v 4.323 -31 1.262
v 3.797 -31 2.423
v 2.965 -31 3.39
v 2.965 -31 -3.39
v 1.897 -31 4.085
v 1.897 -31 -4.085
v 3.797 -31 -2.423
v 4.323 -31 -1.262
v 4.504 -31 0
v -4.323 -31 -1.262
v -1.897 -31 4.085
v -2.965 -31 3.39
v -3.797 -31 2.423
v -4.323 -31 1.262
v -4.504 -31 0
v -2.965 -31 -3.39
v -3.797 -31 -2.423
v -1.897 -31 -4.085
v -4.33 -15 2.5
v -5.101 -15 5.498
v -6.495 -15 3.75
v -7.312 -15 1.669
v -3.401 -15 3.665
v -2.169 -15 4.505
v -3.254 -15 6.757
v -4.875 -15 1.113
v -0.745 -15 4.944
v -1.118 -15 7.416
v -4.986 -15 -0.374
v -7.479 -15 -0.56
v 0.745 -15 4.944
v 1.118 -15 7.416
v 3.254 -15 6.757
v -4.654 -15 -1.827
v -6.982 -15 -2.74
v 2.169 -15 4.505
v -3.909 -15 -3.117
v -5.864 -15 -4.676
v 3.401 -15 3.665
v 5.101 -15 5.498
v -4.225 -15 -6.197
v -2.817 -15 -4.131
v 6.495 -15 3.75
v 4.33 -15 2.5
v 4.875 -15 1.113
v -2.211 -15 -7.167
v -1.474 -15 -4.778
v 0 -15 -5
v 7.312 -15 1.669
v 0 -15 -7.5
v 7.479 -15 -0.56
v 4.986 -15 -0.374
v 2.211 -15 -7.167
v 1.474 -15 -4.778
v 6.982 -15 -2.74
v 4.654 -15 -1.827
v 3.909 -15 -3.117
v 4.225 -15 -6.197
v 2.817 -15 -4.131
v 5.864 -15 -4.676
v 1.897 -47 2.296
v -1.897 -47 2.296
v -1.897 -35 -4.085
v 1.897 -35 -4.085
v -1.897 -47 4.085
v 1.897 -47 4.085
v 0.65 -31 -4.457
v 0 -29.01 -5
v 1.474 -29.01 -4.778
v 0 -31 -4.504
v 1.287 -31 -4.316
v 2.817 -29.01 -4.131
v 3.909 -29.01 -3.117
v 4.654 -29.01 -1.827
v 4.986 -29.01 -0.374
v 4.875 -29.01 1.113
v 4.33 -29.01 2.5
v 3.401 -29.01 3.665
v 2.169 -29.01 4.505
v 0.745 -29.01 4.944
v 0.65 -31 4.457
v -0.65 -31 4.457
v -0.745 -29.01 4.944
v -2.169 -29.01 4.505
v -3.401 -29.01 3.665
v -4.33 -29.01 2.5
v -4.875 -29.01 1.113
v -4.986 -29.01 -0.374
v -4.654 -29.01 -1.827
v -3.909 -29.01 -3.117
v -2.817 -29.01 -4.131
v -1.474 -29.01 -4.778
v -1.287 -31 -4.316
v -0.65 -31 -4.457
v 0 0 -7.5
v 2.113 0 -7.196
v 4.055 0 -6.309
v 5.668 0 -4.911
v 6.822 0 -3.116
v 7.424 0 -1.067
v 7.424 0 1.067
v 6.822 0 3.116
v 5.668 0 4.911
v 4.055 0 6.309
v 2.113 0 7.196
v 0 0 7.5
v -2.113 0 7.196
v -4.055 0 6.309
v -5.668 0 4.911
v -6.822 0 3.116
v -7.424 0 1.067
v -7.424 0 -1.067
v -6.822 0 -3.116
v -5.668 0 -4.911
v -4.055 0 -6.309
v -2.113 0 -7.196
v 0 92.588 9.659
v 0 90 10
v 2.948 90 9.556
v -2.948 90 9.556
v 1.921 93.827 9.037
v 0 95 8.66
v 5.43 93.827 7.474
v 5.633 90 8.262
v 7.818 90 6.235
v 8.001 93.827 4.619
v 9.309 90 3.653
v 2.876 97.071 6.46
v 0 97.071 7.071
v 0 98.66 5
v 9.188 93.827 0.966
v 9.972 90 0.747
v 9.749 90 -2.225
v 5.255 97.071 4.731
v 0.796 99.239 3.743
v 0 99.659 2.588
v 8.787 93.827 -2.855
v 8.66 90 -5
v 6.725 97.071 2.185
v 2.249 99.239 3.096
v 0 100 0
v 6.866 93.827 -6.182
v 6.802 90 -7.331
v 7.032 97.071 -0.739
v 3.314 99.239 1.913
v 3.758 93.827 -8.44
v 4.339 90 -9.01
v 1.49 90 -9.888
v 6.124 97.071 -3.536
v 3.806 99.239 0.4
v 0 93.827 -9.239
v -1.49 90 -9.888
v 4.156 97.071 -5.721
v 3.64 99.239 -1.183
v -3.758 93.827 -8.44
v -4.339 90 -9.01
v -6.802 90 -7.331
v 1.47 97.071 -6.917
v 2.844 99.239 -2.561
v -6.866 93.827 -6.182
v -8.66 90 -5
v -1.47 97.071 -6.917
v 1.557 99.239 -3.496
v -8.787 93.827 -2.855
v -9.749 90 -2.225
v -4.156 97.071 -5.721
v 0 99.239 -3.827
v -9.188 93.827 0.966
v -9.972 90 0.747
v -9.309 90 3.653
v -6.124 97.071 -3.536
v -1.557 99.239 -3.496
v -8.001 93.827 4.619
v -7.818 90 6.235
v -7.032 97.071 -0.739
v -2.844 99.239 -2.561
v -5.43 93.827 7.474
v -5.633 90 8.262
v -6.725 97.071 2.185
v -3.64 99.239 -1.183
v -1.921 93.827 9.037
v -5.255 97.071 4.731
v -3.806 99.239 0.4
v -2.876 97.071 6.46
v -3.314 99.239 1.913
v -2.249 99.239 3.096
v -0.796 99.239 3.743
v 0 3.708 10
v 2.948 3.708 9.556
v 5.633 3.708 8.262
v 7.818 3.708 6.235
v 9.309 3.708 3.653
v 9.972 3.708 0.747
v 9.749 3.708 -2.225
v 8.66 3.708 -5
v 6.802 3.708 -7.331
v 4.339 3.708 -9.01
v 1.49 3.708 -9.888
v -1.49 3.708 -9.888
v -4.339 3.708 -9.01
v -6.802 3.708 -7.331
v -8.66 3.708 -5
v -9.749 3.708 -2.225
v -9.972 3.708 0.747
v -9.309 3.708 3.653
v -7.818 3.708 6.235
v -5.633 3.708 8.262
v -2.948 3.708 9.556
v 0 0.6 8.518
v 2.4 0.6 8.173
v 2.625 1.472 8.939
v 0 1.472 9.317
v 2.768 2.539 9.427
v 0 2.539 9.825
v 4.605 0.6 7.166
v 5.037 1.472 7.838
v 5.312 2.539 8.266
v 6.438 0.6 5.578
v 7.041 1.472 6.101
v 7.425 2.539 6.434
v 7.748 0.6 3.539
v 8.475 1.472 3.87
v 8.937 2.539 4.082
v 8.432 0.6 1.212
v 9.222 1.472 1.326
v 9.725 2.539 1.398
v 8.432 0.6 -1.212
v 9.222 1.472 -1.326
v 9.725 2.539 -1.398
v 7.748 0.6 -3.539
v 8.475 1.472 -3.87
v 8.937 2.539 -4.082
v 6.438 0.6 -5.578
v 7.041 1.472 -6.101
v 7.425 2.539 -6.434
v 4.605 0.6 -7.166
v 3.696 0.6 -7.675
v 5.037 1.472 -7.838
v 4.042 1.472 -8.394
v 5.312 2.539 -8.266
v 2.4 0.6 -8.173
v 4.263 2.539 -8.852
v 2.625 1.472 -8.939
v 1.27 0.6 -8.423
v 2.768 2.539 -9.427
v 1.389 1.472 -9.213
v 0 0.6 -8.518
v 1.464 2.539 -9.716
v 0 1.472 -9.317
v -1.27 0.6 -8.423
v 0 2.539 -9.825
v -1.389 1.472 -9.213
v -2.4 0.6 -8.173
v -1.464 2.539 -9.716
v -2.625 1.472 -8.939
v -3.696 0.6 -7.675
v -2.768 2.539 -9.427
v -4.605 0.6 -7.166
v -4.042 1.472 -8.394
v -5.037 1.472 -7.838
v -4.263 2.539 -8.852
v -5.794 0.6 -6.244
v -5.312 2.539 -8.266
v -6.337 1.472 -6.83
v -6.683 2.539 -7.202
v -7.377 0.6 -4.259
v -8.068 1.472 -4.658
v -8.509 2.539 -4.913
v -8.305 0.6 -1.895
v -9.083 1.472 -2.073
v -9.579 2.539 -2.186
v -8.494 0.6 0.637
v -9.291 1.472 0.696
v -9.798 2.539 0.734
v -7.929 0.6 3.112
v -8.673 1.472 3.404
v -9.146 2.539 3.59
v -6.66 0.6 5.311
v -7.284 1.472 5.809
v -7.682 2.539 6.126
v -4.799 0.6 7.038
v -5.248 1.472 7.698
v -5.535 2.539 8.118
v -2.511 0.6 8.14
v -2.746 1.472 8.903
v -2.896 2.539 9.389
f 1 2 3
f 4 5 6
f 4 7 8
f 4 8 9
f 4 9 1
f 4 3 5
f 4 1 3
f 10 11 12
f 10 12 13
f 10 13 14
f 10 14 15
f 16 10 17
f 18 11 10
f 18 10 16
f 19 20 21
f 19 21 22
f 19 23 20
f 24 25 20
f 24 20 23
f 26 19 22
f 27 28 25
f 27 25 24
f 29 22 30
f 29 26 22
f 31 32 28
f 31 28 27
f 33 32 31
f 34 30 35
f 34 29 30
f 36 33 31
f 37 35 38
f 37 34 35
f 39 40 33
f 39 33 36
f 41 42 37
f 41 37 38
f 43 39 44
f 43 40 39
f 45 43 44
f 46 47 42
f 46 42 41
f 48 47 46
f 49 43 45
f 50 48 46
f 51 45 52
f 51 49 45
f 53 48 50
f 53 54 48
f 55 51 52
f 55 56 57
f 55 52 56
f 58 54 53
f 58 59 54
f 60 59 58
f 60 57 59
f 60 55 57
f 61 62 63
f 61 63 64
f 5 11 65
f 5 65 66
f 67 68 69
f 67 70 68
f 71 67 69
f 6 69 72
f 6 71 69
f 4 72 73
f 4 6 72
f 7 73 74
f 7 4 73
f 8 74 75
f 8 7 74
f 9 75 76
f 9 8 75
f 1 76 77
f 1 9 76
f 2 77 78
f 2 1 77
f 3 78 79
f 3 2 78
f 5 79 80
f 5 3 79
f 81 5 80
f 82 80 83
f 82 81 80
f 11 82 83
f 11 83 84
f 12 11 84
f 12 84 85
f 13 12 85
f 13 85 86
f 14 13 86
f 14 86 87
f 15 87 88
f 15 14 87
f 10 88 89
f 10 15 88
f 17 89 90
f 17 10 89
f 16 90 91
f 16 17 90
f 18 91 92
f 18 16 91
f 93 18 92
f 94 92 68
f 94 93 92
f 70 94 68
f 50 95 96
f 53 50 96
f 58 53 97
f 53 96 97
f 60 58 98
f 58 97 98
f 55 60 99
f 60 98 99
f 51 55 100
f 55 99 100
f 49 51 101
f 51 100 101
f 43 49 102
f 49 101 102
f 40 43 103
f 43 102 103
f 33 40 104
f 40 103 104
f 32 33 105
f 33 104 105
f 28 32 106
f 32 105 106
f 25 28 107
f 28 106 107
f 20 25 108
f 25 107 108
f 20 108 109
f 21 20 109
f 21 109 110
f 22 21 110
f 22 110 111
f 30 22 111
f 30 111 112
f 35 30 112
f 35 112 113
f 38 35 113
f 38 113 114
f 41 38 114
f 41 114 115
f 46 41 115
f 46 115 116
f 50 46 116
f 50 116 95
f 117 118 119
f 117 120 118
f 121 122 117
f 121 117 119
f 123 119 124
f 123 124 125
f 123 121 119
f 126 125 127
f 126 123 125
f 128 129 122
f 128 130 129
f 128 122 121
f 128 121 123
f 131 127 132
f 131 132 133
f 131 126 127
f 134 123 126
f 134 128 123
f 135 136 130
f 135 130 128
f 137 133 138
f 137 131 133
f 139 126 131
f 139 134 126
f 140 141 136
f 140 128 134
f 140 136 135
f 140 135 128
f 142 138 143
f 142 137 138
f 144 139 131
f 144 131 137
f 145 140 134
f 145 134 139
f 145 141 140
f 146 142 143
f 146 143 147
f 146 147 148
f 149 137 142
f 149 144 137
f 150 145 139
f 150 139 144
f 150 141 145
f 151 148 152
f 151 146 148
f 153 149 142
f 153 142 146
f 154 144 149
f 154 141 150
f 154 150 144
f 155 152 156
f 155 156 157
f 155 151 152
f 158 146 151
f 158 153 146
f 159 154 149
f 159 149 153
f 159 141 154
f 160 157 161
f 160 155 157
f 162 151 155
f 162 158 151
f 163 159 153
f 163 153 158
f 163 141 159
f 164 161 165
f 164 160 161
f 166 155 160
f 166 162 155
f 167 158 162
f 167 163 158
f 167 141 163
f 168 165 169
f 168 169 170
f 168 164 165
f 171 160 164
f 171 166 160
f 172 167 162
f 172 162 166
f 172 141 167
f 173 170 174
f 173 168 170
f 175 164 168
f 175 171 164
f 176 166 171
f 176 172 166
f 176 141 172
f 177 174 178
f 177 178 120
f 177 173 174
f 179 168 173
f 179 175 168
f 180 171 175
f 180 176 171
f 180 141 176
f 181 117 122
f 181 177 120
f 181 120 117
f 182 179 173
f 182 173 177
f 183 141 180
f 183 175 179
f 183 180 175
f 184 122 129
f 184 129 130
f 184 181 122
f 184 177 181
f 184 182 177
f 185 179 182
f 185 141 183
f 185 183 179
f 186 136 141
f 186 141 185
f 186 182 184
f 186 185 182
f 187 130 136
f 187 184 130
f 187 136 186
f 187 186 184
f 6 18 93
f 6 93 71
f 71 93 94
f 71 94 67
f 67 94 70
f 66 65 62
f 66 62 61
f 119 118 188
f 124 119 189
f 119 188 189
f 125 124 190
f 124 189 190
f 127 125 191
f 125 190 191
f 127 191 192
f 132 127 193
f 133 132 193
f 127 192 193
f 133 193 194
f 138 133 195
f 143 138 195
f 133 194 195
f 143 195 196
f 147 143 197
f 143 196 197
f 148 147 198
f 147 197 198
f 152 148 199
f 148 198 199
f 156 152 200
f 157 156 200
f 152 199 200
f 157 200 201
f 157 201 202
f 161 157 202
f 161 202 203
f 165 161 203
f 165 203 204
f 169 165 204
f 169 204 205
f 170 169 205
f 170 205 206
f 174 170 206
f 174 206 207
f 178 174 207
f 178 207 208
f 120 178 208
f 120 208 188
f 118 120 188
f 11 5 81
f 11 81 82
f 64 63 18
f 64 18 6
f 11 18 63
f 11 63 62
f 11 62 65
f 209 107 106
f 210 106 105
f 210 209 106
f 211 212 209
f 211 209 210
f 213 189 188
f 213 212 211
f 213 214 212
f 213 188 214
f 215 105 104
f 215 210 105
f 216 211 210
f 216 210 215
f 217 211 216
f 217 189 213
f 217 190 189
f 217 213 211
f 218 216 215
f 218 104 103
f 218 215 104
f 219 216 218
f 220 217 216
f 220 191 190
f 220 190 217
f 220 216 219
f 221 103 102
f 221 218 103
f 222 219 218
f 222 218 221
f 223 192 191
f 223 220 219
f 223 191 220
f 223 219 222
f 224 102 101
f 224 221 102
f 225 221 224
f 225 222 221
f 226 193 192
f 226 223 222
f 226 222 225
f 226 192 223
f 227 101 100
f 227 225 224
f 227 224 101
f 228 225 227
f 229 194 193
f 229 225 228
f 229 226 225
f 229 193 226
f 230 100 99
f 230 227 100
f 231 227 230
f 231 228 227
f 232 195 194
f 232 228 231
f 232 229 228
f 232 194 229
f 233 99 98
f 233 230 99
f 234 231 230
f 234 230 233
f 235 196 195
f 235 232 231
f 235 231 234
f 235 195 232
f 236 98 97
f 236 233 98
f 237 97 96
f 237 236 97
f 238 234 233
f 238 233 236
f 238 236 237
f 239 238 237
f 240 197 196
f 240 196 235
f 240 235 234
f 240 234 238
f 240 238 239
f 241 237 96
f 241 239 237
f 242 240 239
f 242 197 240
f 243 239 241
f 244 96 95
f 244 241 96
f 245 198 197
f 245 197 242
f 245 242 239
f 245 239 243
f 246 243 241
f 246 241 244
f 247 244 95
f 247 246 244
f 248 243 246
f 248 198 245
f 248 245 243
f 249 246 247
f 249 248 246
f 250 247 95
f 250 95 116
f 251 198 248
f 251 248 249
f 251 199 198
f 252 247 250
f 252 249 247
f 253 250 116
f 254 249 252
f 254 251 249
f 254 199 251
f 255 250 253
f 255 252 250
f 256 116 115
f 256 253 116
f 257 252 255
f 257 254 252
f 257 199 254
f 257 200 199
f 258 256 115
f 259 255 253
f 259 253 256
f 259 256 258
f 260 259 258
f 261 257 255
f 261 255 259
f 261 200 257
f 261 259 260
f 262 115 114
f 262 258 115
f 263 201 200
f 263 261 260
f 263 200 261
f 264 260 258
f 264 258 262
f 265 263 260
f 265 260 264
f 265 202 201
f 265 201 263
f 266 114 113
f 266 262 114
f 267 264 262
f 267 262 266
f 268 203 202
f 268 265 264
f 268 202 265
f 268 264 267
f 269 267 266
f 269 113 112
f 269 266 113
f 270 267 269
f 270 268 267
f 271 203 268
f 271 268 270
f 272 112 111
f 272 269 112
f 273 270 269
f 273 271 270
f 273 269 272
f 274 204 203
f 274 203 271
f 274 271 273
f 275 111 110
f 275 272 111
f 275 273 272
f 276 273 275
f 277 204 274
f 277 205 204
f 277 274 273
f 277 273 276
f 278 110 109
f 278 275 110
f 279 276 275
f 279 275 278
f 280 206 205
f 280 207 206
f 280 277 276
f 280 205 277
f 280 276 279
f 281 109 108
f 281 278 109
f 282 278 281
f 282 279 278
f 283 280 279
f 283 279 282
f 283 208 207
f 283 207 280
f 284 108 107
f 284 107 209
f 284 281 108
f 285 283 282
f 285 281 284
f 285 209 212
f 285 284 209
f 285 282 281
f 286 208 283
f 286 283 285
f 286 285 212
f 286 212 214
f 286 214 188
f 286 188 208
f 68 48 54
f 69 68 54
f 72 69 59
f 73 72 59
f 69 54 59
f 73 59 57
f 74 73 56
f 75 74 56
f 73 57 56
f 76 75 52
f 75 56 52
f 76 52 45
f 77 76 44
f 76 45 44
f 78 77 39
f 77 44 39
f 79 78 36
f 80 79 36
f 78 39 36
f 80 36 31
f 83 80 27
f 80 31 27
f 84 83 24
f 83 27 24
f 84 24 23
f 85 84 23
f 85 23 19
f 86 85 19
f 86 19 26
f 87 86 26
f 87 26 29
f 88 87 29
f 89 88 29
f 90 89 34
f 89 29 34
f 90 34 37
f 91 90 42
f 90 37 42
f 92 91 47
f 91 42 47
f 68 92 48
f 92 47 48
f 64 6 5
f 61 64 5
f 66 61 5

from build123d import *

# Parameters (mm, degrees)
CROQUIS1_R              = 10
SALIENTE_EXTRUIR1_DEPTH = 100
CROQUIS2_R              = 7.5
SALIENTE_EXTRUIR2_DEPTH = 15
CROQUIS3_R              = 5
SALIENTE_EXTRUIR3_DEPTH = 16
REDONDEO1_R             = 4
CHAFL_N1_SIZE           = 1.99
CHAFL_N1_SIZE2          = 0.496162726
CROQUIS4_W              = 3.793672416
CROQUIS4_H              = 8.169837842
SALIENTE_EXTRUIR4_DEPTH = 16
CHAFL_N2_SIZE           = 12
CHAFL_N2_SIZE2          = 6.38051318
REDONDEO2_R             = 10


with BuildPart() as part:
    # Croquis1 → Saliente-Extruir1 (new body)
    with BuildSketch(Plane(origin=(0, 0, 0), x_dir=(1, 0, 0), z_dir=(0, 1, 0))):
        with Locations(Location((0, 0, 0), (0, 0, 270))):
            Circle(CROQUIS1_R)
    extrude(amount=SALIENTE_EXTRUIR1_DEPTH)

    # Croquis2 → Saliente-Extruir2 (add)
    with BuildSketch(Plane.XZ):
        with Locations(Location((0, 0, 0), (0, 0, 270))):
            Circle(CROQUIS2_R)
    extrude(amount=SALIENTE_EXTRUIR2_DEPTH)

    # Croquis3 → Saliente-Extruir3 (add)
    with BuildSketch(Plane.XZ.offset(15)):
        with Locations(Location((0, 0, 0), (0, 0, 270))):
            Circle(CROQUIS3_R)
    extrude(amount=SALIENTE_EXTRUIR3_DEPTH)

    # Redondeo1
    # the kernel refuses this fillet: 4 mm, written as the material it takes off along each edge
    with BuildSketch(Plane(origin=(0, 0, 0), x_dir=(0, 0, 1), z_dir=(-1, 0, 0))) as redondeo1_piece_1:
        with BuildLine():
            CenterArc((6, 3.708099244), REDONDEO1_R, 292.024312837, 67.975687163)
            Line((7.5, 0), (7.53, -0.074161985))
            ThreePointArc((7.53, -0.074161985), (8.75, -0.08), (10, -0.08))
            Line((10, -0.08), (10.08, 0))
            Line((10.08, 0), (10.08, 3.708099244))
            Line((10.08, 3.708099244), (10, 3.708099244))
        make_face()
    revolve(axis=Axis((0, 0, 0), (0, 1, 0)), mode=Mode.SUBTRACT)

    # Chaflán1
    chafl_n1_edges = [part.edges().sort_by_distance(p)[0] for p in [
        (0, -31, 5),
    ]]
    chafl_n1_side = [part.faces().sort_by_distance(p)[0] for p in [
        (0, -23, 5),
    ]]
    chamfer(chafl_n1_edges, length=CHAFL_N1_SIZE, length2=CHAFL_N1_SIZE2, reference=chafl_n1_side[0])

    # Croquis4 → Saliente-Extruir4 (add)
    with BuildSketch(Plane.XZ.offset(31)):
        Rectangle(CROQUIS4_W, CROQUIS4_H)
    extrude(amount=SALIENTE_EXTRUIR4_DEPTH)

    # Chaflán2
    chafl_n2_edges = [part.edges().sort_by_distance(p)[0] for p in [
        (0, -47, -4.084918921),
    ]]
    chafl_n2_side = [part.faces().sort_by_distance(p)[0] for p in [
        (0, -39, -4.084918921),
    ]]
    chamfer(chafl_n2_edges, length=CHAFL_N2_SIZE, length2=CHAFL_N2_SIZE2, reference=chafl_n2_side[0])

    # Redondeo2
    redondeo2_edges = [part.edges().sort_by_distance(p)[0] for p in [
        (0, 100, -10),
    ]]
    fillet(redondeo2_edges, radius=REDONDEO2_R)


solid = part.part
